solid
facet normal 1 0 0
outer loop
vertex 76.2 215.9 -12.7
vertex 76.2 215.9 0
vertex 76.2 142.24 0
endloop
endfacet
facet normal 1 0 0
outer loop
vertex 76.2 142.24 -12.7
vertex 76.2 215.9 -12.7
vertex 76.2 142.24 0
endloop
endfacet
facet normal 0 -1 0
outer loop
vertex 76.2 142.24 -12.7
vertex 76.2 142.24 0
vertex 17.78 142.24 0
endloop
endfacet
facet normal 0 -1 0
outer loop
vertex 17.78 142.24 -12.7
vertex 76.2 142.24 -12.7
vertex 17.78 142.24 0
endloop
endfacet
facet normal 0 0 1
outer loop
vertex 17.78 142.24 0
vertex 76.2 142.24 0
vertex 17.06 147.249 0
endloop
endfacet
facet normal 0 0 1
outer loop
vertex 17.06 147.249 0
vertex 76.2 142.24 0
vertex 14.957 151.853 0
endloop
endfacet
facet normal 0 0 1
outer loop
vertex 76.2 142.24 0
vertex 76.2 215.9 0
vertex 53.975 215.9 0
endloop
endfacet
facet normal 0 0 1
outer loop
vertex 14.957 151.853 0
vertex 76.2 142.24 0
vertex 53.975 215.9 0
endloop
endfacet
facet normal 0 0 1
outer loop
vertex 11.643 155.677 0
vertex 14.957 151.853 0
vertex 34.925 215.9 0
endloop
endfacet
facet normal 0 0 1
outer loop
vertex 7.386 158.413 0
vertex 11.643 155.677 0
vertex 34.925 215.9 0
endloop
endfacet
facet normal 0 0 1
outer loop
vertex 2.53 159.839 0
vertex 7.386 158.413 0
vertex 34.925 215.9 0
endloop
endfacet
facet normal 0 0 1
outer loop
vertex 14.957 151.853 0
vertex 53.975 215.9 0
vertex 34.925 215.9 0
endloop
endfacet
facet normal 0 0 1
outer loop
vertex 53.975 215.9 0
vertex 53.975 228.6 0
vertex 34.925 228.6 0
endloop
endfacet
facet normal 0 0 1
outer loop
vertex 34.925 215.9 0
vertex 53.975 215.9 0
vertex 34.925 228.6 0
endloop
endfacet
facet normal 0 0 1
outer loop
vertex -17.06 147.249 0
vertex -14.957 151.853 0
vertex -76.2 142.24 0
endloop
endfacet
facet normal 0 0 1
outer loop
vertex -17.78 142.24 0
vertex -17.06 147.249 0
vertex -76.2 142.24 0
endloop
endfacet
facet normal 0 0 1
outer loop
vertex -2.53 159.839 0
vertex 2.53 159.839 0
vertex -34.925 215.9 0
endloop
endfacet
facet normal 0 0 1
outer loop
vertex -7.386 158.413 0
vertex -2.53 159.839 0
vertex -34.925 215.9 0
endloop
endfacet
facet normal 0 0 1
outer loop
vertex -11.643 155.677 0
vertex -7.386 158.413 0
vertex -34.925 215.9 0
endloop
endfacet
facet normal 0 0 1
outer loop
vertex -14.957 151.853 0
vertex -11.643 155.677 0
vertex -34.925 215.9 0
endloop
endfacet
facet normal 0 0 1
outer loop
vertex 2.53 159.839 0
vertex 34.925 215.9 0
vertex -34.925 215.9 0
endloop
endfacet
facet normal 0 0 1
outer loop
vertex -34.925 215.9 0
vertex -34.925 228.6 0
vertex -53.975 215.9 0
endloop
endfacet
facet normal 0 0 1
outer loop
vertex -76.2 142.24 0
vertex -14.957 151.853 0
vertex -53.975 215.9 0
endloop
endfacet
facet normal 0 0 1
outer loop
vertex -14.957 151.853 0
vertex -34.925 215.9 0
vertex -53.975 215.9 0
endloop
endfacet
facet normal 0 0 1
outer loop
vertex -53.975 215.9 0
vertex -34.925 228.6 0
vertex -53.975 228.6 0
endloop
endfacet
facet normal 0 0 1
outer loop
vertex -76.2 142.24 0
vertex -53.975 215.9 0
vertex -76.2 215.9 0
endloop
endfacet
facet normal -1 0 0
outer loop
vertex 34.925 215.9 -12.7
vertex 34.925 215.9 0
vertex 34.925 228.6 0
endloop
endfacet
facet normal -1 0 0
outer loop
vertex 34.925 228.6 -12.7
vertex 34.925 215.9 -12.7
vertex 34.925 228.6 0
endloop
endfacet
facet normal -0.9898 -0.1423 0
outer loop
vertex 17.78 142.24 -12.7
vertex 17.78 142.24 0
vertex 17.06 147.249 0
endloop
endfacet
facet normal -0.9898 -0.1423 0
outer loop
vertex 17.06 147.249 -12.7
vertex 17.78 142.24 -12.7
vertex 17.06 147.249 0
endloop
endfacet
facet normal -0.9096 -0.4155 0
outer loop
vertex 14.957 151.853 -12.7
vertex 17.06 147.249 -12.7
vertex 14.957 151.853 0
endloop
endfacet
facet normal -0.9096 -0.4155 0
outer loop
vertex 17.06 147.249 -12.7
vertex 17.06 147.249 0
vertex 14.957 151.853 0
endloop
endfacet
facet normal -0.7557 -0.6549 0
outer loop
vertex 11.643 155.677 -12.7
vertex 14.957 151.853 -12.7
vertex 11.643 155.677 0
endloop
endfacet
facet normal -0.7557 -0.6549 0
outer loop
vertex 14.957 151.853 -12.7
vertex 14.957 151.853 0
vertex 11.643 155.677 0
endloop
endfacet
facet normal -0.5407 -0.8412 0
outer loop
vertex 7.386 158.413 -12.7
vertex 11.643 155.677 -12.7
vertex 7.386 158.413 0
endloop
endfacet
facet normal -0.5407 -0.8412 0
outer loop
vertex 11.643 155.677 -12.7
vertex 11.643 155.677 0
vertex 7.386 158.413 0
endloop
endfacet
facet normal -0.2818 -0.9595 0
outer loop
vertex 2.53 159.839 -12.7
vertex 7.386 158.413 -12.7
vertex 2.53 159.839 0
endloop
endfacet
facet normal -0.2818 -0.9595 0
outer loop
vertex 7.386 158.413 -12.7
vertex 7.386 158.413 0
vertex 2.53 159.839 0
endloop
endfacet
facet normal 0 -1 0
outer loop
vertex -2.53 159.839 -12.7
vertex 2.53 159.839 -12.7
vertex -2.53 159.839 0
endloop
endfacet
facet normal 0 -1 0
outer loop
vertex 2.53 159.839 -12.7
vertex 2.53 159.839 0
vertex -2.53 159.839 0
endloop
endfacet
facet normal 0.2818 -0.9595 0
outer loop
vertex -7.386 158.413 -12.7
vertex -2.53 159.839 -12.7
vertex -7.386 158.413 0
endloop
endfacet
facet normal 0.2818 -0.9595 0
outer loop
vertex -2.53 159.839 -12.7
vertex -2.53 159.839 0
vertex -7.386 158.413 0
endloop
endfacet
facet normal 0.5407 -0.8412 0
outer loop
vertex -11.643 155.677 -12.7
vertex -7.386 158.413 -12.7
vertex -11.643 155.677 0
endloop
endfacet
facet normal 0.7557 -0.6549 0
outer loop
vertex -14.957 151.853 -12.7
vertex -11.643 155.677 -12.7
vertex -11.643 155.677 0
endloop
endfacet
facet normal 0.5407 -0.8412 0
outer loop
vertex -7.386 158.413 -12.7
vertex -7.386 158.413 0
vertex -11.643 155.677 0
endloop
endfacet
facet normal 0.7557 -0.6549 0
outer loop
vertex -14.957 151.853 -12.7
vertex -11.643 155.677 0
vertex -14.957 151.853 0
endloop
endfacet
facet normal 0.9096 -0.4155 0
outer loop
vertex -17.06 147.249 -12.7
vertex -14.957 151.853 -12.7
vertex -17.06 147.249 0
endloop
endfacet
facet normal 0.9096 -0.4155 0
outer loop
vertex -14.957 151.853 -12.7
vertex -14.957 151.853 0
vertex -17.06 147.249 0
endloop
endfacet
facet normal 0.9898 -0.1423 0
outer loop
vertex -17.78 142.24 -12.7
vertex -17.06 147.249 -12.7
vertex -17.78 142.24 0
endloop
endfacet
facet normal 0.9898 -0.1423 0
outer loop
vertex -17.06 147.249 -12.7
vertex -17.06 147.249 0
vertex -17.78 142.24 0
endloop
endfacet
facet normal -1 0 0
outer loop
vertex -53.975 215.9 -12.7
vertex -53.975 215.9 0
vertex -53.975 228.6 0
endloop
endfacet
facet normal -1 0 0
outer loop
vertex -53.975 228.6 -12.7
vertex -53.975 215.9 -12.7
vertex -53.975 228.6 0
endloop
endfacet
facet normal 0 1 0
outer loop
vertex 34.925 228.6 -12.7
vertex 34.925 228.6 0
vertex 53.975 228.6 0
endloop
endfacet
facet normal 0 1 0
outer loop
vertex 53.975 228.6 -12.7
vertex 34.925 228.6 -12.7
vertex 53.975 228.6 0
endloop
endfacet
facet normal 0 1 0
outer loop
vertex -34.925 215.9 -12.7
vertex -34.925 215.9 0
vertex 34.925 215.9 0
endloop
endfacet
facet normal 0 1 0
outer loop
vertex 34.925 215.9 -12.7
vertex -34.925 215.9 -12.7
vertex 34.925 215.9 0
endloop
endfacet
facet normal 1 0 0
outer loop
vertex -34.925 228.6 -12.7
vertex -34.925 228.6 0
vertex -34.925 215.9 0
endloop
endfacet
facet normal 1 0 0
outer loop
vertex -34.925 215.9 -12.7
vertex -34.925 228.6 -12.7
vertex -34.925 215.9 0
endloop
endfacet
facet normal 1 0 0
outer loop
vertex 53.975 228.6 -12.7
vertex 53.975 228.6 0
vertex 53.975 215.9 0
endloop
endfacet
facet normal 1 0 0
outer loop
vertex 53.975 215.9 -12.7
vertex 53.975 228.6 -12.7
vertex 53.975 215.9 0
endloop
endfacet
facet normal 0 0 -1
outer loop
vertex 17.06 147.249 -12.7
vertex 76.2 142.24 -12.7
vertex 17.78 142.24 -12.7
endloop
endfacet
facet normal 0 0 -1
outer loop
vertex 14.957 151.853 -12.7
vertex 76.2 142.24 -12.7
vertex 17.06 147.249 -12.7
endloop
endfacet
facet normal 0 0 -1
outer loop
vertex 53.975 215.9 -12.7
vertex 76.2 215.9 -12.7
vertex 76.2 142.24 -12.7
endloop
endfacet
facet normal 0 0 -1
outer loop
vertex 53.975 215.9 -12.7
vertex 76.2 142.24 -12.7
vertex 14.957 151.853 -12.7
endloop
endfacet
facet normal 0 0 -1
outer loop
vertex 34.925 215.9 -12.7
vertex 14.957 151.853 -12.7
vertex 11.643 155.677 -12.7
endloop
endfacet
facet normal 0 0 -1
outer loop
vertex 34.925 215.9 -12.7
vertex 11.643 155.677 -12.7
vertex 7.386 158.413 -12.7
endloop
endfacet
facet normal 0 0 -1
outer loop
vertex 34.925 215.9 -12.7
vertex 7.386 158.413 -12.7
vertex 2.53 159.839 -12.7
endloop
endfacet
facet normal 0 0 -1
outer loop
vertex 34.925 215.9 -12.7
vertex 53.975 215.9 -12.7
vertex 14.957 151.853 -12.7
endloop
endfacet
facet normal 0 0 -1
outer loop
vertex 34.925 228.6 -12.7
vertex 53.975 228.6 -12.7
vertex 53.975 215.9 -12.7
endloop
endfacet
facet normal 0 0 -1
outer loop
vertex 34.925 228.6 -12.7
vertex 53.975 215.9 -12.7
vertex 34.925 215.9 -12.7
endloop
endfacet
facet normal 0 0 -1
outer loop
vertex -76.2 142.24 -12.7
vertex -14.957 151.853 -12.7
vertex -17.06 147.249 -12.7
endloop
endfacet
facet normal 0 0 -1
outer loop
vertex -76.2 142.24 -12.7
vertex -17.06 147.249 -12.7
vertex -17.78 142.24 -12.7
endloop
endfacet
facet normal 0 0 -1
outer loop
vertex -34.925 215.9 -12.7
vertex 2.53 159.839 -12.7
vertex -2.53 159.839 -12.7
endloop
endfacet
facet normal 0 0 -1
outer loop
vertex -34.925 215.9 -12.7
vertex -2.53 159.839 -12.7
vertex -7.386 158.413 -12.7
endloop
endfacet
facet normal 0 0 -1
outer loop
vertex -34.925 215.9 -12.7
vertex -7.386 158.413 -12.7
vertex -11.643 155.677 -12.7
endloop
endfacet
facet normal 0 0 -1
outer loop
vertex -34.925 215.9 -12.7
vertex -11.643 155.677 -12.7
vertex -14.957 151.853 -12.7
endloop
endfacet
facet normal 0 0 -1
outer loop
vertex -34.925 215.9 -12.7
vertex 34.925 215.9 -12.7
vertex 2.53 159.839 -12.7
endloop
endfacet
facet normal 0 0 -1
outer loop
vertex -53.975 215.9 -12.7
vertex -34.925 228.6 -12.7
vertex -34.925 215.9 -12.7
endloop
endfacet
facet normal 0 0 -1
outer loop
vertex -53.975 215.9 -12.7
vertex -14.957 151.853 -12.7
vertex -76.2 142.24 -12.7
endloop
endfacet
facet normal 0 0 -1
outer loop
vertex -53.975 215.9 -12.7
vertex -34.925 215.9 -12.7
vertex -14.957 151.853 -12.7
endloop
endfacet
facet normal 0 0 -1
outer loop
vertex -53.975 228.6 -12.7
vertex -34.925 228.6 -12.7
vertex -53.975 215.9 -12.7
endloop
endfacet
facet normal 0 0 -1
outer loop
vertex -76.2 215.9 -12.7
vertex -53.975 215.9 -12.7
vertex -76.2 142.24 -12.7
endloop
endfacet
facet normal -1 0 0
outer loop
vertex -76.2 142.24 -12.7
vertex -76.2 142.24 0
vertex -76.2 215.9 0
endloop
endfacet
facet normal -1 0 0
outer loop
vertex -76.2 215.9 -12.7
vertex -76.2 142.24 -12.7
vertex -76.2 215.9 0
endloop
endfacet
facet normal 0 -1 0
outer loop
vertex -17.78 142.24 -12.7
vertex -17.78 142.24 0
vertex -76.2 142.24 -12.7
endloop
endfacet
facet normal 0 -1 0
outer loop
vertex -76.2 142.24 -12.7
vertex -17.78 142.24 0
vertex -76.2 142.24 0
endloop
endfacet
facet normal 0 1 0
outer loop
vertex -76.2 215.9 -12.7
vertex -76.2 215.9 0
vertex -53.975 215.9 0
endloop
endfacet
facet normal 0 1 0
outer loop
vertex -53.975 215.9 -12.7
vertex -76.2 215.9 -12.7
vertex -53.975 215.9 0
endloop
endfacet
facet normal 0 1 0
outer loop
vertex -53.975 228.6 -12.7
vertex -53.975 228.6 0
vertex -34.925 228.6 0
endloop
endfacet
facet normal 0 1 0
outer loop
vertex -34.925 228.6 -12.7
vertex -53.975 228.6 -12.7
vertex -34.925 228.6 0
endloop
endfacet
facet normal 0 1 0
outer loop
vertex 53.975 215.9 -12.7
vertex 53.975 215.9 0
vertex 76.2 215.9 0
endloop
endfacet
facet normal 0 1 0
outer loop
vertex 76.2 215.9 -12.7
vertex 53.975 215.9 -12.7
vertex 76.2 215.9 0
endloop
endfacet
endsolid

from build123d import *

# Parameters (mm, degrees)
EXTRUDE1_DEPTH     = 12.7
SKETCH2_R          = 17.78
CUT_EXTRUDE1_DEPTH = 242.3


with BuildPart() as part:
    # Sketch1 → Extrude1 (new body)
    with BuildSketch(Plane.XY):
        Polygon((-76.2, 215.9), (-53.975, 215.9), (-53.975, 228.6), (-34.925, 228.6), (-34.925, 215.9), (34.925, 215.9), (34.925, 228.6), (53.975, 228.6), (53.975, 215.9), (76.2, 215.9), (76.2, 142.24), (-76.2, 142.24), align=None)
    extrude(amount=-EXTRUDE1_DEPTH)

    # Sketch2 → Cut-Extrude1 (cut, through all)
    with BuildSketch(Plane.XY):
        with Locations((0, 142.24)):
            Circle(SKETCH2_R)
    extrude(amount=-CUT_EXTRUDE1_DEPTH, mode=Mode.SUBTRACT)


solid = part.part
